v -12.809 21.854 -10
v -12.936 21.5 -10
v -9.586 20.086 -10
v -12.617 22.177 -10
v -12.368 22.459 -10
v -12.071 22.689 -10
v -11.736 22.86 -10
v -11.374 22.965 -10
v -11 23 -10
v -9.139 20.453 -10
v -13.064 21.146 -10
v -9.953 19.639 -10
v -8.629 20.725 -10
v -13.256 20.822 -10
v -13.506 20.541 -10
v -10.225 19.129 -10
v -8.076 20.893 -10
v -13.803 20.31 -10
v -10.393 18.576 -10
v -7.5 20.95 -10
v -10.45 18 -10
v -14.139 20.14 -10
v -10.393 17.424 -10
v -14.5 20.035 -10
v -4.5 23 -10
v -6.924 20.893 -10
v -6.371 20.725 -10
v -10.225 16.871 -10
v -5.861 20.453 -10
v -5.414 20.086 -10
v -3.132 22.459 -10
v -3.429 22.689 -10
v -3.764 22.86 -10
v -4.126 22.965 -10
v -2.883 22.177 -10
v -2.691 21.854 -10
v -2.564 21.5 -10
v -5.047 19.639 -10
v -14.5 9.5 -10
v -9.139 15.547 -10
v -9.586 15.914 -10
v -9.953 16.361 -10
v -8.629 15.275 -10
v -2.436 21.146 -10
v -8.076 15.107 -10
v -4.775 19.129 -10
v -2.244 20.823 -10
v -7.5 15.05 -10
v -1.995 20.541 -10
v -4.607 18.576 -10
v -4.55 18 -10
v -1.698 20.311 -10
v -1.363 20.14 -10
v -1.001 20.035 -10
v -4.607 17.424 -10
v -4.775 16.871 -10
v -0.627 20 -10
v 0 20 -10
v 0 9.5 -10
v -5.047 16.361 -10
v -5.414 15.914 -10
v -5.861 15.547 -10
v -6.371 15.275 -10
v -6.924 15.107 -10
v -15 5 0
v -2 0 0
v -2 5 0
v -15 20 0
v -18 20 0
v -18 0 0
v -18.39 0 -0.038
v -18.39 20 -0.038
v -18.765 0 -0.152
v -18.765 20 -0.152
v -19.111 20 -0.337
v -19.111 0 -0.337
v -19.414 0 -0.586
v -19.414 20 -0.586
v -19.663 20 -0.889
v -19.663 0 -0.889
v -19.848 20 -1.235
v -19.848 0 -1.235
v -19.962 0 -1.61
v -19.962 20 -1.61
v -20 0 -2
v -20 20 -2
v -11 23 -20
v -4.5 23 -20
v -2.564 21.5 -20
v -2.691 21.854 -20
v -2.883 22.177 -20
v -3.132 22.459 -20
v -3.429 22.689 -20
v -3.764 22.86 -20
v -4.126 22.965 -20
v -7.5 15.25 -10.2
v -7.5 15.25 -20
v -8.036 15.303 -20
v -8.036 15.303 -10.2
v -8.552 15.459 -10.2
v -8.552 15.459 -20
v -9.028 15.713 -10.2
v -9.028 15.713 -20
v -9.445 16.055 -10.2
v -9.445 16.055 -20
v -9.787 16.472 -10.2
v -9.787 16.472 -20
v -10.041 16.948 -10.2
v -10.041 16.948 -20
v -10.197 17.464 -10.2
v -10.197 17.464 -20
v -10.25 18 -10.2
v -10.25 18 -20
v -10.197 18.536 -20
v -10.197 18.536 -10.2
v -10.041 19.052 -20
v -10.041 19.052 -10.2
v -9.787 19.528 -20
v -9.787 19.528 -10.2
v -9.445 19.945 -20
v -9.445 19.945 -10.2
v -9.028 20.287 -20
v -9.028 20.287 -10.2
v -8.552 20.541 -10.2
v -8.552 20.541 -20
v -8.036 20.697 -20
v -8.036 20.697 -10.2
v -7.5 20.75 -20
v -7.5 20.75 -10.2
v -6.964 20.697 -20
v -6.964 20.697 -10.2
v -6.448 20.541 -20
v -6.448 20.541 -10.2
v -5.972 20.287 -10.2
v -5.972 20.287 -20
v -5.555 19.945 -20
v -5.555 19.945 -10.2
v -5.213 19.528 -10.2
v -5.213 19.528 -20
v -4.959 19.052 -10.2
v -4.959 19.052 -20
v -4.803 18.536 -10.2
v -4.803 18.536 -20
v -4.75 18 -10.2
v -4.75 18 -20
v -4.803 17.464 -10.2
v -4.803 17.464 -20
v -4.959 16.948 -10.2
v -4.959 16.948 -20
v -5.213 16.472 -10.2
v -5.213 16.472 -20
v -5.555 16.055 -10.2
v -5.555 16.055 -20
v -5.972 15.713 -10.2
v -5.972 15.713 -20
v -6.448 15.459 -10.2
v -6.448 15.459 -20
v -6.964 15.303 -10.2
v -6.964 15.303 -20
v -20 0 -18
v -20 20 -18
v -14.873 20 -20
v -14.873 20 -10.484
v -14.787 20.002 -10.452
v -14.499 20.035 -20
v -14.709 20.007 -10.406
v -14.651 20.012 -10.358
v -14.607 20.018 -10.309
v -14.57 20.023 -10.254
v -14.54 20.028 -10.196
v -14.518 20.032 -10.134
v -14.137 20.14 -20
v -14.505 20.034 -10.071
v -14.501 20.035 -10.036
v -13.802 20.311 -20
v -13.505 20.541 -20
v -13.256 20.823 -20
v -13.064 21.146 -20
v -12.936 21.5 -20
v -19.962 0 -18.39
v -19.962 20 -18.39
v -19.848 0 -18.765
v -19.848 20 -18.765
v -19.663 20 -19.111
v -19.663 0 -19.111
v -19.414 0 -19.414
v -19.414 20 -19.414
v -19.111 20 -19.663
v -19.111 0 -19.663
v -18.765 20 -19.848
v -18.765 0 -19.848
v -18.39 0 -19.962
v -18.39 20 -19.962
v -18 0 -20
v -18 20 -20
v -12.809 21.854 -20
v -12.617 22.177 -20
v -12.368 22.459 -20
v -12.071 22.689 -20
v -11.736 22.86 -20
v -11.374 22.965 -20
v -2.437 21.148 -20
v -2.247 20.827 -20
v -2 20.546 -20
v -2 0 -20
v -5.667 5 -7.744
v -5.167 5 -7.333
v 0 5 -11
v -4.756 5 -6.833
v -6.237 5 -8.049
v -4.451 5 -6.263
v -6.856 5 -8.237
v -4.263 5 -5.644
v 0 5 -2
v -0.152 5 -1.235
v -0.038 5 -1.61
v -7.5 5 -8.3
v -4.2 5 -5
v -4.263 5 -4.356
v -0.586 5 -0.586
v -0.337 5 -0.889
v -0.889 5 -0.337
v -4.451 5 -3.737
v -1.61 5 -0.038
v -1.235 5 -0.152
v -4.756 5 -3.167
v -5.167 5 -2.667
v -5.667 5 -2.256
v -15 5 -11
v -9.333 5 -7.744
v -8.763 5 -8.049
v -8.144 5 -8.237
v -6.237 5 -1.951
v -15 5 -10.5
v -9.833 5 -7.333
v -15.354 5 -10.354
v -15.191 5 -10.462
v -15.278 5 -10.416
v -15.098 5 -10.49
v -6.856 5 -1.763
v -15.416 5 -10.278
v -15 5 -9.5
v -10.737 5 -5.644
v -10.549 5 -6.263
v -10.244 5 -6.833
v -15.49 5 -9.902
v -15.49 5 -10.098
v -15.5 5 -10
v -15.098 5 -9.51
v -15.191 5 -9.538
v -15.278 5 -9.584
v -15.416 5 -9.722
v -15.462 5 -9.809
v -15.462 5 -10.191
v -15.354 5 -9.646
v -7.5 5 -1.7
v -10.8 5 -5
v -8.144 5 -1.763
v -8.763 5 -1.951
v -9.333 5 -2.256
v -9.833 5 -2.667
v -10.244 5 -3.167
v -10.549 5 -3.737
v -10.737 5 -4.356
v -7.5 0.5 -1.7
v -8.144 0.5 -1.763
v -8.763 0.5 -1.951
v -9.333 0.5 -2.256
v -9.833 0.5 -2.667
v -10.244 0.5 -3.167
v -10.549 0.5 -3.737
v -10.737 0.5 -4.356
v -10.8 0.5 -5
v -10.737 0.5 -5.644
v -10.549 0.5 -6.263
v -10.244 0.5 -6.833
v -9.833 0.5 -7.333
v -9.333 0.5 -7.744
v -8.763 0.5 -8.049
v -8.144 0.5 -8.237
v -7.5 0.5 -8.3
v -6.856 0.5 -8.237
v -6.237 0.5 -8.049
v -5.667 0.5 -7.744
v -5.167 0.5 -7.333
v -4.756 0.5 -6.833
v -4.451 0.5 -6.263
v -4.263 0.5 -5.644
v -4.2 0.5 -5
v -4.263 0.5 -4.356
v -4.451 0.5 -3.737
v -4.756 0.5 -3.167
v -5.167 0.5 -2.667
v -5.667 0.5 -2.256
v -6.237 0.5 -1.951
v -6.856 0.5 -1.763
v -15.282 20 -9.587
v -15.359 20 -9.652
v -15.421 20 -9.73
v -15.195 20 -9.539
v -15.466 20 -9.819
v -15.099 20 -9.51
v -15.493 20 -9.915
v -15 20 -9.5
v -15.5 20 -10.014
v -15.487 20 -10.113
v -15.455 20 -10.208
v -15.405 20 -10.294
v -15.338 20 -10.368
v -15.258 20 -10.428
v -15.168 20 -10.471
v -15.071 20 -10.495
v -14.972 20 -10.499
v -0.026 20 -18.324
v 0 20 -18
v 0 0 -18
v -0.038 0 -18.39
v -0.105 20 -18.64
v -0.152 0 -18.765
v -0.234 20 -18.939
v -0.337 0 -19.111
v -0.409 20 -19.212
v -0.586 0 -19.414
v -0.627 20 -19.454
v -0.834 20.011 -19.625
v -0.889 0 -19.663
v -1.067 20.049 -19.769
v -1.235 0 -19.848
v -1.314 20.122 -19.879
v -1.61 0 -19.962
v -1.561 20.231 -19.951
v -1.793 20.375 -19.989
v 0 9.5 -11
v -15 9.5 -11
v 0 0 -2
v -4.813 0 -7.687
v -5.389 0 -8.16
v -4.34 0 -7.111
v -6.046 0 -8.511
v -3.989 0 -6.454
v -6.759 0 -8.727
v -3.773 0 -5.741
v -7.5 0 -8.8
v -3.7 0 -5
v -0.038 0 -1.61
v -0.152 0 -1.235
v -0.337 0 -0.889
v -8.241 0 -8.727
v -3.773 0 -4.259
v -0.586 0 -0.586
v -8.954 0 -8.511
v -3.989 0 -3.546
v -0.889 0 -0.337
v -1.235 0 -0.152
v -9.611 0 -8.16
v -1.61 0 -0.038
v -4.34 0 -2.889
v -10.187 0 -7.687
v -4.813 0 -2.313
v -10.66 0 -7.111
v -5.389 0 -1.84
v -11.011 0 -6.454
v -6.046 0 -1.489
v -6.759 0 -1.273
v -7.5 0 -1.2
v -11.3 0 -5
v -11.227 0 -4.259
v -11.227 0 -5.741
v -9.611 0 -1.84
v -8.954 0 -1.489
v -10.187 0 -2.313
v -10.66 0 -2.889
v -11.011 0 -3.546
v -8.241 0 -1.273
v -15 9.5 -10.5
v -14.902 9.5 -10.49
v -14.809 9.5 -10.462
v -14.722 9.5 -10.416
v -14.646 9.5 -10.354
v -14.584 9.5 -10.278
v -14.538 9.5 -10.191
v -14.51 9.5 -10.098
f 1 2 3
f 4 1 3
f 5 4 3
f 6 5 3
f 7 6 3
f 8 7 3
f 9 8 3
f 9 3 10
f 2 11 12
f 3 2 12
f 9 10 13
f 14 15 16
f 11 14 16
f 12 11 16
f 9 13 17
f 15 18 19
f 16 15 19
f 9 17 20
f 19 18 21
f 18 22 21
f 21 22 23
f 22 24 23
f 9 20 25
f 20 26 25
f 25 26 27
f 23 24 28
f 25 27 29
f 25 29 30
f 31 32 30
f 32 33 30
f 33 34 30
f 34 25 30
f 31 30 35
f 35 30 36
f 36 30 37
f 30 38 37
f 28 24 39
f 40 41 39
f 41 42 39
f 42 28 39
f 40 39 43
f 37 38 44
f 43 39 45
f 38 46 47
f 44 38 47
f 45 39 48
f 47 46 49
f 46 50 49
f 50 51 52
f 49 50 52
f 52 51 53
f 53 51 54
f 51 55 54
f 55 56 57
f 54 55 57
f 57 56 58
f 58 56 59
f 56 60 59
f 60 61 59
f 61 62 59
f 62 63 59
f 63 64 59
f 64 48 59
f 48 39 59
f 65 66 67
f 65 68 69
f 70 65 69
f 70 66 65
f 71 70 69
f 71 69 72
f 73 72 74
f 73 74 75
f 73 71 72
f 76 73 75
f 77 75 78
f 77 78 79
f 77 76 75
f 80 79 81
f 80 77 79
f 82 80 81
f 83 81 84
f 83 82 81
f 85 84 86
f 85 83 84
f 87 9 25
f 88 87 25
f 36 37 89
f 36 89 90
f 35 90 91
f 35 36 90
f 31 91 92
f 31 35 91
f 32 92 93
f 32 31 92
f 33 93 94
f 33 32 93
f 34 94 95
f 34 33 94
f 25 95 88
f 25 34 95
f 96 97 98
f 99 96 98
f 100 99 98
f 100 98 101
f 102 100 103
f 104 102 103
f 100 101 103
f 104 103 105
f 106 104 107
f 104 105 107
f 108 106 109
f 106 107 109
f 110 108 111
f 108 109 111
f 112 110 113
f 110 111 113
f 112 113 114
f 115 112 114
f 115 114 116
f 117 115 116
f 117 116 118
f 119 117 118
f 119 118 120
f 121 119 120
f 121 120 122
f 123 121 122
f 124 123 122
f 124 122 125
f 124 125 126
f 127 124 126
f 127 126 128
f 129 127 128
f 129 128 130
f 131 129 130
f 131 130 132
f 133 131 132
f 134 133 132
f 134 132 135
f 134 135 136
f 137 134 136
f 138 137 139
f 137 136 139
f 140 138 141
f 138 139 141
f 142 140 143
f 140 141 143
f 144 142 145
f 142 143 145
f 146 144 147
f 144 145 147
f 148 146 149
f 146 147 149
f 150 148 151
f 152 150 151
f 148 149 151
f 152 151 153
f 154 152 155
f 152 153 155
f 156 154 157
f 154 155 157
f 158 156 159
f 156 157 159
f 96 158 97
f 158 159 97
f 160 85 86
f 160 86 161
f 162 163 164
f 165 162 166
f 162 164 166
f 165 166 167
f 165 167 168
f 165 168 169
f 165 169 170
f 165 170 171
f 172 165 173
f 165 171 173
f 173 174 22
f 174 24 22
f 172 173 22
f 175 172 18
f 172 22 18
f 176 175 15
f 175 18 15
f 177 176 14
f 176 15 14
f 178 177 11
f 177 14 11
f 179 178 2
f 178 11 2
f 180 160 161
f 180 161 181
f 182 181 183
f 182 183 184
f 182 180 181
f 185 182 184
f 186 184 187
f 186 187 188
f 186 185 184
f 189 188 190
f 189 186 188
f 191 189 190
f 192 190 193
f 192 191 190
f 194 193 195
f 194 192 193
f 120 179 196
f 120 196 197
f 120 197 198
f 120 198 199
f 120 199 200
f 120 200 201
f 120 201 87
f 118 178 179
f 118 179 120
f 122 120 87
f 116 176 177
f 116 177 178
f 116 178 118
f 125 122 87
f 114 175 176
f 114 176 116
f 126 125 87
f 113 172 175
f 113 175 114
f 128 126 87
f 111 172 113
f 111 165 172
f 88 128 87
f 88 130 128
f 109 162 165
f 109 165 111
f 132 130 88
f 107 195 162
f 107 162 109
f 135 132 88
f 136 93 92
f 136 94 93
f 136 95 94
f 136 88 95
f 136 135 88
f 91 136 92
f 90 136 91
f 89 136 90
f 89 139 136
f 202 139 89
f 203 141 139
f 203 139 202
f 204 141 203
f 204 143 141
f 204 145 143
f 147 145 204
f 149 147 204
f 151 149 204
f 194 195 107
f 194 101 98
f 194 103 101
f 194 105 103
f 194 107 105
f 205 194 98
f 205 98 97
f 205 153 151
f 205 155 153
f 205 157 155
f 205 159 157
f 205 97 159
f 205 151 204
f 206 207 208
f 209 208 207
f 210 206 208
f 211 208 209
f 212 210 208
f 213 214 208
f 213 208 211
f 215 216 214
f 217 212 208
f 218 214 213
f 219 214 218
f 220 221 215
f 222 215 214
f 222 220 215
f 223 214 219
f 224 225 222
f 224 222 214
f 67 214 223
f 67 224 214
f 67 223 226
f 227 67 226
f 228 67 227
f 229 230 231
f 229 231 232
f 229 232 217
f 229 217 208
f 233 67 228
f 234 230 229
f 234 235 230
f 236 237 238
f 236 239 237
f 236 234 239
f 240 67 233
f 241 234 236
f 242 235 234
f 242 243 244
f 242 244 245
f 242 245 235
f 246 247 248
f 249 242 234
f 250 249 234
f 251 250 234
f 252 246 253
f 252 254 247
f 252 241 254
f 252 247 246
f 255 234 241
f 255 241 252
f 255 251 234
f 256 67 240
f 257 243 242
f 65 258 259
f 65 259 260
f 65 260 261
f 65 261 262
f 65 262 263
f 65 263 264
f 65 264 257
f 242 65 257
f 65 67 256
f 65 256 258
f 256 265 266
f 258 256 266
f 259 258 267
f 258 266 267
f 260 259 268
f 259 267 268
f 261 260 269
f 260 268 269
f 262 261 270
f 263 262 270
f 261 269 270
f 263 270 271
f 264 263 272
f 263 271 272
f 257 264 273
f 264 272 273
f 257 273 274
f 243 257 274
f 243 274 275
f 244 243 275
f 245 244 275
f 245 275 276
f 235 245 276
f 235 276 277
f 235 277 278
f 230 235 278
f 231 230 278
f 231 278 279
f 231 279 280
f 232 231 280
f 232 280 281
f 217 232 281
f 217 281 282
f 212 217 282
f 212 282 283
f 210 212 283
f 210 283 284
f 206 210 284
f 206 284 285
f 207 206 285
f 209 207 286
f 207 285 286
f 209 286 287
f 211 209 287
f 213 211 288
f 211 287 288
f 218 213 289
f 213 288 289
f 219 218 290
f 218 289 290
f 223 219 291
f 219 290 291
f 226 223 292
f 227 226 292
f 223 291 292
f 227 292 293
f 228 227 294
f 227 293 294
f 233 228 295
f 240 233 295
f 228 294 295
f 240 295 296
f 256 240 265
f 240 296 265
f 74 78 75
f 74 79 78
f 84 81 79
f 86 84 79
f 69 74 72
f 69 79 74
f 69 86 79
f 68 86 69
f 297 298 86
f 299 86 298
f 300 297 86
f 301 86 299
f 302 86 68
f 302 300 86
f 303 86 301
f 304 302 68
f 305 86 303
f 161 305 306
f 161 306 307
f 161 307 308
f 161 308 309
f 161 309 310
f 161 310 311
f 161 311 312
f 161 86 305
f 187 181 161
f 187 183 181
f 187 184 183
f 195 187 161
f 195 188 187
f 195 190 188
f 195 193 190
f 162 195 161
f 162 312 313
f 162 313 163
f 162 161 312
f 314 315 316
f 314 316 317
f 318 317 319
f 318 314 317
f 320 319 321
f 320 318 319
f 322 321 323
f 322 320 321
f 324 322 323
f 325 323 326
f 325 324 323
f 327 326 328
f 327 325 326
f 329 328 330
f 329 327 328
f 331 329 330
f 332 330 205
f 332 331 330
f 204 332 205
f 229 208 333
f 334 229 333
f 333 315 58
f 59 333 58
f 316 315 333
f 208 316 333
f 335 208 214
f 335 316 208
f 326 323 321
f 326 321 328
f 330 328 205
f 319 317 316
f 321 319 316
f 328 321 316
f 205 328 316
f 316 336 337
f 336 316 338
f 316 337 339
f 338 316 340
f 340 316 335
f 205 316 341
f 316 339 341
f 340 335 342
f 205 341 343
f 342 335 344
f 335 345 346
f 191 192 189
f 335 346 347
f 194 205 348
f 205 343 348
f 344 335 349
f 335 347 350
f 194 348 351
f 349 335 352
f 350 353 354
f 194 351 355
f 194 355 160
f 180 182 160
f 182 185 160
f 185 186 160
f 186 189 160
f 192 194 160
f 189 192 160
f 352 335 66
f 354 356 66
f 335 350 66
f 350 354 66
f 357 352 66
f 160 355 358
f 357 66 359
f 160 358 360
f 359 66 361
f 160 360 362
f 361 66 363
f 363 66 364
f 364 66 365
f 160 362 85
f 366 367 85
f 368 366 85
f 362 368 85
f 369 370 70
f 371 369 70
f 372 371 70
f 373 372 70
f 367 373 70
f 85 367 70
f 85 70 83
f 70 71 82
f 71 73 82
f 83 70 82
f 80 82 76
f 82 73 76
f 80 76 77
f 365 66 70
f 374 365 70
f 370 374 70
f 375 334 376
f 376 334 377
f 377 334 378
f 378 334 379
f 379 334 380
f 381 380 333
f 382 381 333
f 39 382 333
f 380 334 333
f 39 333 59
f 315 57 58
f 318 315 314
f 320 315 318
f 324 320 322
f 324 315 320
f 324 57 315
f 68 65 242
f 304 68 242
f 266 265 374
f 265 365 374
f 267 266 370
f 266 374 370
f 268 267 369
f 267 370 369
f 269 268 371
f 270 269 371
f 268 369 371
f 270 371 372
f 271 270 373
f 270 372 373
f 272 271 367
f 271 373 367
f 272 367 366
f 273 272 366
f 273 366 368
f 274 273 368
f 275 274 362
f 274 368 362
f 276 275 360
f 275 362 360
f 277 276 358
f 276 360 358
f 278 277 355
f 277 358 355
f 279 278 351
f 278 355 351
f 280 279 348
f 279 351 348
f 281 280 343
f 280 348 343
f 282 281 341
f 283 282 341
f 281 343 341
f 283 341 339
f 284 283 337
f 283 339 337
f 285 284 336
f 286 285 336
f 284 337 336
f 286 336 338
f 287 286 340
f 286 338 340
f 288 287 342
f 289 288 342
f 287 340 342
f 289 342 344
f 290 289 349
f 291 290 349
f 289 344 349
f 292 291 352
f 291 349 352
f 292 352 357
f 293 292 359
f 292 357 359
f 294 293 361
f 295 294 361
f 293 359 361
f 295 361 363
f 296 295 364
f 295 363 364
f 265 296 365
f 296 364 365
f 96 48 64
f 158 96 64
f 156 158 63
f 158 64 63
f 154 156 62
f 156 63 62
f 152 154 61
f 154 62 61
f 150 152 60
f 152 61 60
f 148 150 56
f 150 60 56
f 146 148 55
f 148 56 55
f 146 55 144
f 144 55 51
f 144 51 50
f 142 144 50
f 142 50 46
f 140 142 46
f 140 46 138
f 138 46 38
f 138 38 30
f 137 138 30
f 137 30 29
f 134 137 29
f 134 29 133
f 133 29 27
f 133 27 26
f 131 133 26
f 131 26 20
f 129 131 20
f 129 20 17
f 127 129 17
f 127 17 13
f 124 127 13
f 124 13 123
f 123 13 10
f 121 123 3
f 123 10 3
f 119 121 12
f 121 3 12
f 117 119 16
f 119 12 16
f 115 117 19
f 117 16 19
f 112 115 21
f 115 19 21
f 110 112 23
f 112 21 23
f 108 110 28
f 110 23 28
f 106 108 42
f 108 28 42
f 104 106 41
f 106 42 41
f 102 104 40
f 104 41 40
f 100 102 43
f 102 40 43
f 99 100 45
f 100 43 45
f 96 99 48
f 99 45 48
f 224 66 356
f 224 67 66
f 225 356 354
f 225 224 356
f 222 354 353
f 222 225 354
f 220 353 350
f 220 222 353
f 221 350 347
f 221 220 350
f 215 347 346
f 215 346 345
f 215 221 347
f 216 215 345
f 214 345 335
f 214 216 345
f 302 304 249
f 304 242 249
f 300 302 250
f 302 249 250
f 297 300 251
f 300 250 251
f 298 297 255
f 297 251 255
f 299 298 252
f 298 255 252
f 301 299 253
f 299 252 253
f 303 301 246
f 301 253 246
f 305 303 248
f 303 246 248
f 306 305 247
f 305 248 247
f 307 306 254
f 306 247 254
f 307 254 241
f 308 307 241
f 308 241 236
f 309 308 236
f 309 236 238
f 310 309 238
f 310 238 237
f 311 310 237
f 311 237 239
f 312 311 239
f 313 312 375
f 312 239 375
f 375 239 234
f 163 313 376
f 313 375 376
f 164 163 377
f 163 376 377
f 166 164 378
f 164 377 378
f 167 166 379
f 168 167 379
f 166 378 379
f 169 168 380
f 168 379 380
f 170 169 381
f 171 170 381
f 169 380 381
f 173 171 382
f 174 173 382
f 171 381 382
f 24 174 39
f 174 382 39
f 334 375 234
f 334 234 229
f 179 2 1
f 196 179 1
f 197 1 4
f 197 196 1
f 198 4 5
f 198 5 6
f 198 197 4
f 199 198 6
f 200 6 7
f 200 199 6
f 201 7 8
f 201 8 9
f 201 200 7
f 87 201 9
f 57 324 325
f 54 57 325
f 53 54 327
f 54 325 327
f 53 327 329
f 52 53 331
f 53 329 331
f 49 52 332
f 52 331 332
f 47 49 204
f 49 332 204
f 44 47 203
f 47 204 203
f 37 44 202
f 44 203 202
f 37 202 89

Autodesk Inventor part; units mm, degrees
ref_plane "YZ Plane" through (0, 0, 0) normal (1, 0, 0) x (0, 1, 0)
ref_plane "XZ Plane" through (0, 0, 0) normal (0, 1, 0) x (-1, 0, 0)
sketch "Sketch1" plane through (0, 0, 0) normal (0, 1, 0) x (-1, 0, 0)
  line L0 (0, 0) -> (20, 0)
  line L1 (20, 0) -> (20, -20)
  line L2 (20, -20) -> (0, -20)
  line L3 (0, -20) -> (0, 0)
  dimension "d0" = 20
  dimension "d1" = 20
extrude "Extrusion1" add sketch "Sketch1" along normal blind 5
sketch "Sketch2" plane through (0, 5, 0) normal (0, 1, 0) x (1, 0, 0)
  line L0 (0, 0) -> (0, 20) projected
  line L1 (-20, 0) -> (0, 0) projected
  point P0 (-7.5, 5)
  dimension "d4" = 7.5
  dimension "d55" = 5
hole "Hole1" at (-7.5, 5, -5) direction (0, -1, 0) diameter 6.6 end through all clearance for "Countersunk Flat Head Screw ISO 2009/7046" size "M6" standard "ISO"
chamfer "Chamfer1" distance 0.5 angle 45 1 edges at (-7.5, 0, -8.3)
sketch "Sketch3" plane through (0, 5, 0) normal (0, 1, 0) x (1, 0, 0)
  circle A0 centre (-7.5, 5) radius 3.3 construction
  line L0 (0, 20) -> (-20, 20) construction
  line L1 (-20, 20) -> (-20, 0) construction
  line L2 (-20, 0) -> (0, 0) construction
  line L3 (0, 0) -> (0, 20) construction
  line L4 (-20, 20) -> (-20, 0) construction
  line L5 (0, 20) -> (-20, 20) construction
  line L6 (-20, 0) -> (-15, 0)
  line L7 (-15, 0) -> (-15, 20)
  line L8 (-15, 20) -> (-20, 20)
  line L9 (-20, 20) -> (-20, 0)
  line L10 (0, 20) -> (-20, 20)
  line L11 (-20, 20) -> (-20, 10)
  line L12 (-20, 10) -> (0, 10)
  line L13 (0, 10) -> (0, 20)
  point P0 (-15, 10)
  dimension "d56" = 15
  dimension "d57" = 10
extrude "Extrusion2" add sketch "Sketch3" along normal blind 15
sketch "Sketch6" plane through (0, 20, 0) normal (0, 1, 0) x (1, 0, 0)
  line L0 (0, 20) -> (-20, 20) construction
  line L1 (-20, 20) -> (-20, 0) construction
  line L2 (-20, 0) -> (-15, 0) construction
  line L3 (-15, 0) -> (-15, 10) construction
  line L4 (-15, 10) -> (0, 10) construction
  line L5 (0, 10) -> (0, 20) construction
  line L6 (-2.5, 10) -> (-13, 10)
  line L7 (-13, 10) -> (-13, 20)
  line L8 (-13, 20) -> (-2.5, 20)
  line L9 (-2.5, 20) -> (-2.5, 10)
  dimension "d32" = 2.5
  dimension "d33" = 10.5
  dimension "d34" = 2
extrude "Extrusion5" add sketch "Sketch6" along normal blind 3
fillet "Fillet4" radius 2 6 edges at (-13, 23, -15) (-2.5, 23, -15) (0, 2.5, 0) (-20, 10, 0) (0, 10, -20) (-20, 10, -20)
sketch "Sketch7" plane through (0, 5, -10) normal (0, 0, 1) x (1, 0, 0)
  line L0 (-11, 18) -> (-4.5, 18) projected
  line L1 (0, 0) -> (0, 15) projected
  point P0 (0, -5)
  point P1 (-7.5, 13)
  dimension "d36" = 5
  dimension "d58" = 7.5
hole "Hole2" at (-7.5, 18, -10) direction (0, 0, -1) diameter 5.5 end through all clearance for "Countersunk Flat Head Screw ISO 2009/7046" size "M5" standard "ISO"
fillet "Fillet5" radius 2 2 edges at (-2.5, 20, -15) (-13, 20, -15)
chamfer "Chamfer2" distance 0.2 angle 45 1 edges at (-7.5, 20.75, -10)
ref_plane "Work Plane1" through (0, 21, 0) normal (0, 1, 0) x (1, 0, 0)
sketch "Sketch9" plane through (0, 21, 0) normal (0, 1, 0) x (1, 0, 0)
  line L0 (-15, 10) -> (-15, 0) projected
  point P0 (0, 0)
hole "Hole4" at (-15, 21, -10) direction (0, -1, 0) diameter 1 depth 16
sketch "Sketch10" plane through (0, 5, -10) normal (1, 0, 0) x (0, 0, -1)
  line L0 (8, 15) -> (8, -5) construction
  line L1 (0, 15) -> (8, 15) construction
  line L2 (0, 0) -> (0, 15) construction
  line L3 (-8, 0) -> (0, 0) construction
  line L4 (-8, -5) -> (-8, 0) construction
  line L5 (-8, -5) -> (8, -5) construction
  line L6 (0, 0) -> (1, 0)
  line L7 (1, 0) -> (1, 4.5)
  line L8 (1, 4.5) -> (0, 4.5)
  line L9 (0, 4.5) -> (0, 0)
  point P0 (-10, -5)
  dimension "d67" = 1
  dimension "d68" = 4.5
extrude "Extrusion6" cut sketch "Sketch10" against normal up to surface (15 mm away)
properties part number "KN-00-02-08" material "X5CrNi18-10"
